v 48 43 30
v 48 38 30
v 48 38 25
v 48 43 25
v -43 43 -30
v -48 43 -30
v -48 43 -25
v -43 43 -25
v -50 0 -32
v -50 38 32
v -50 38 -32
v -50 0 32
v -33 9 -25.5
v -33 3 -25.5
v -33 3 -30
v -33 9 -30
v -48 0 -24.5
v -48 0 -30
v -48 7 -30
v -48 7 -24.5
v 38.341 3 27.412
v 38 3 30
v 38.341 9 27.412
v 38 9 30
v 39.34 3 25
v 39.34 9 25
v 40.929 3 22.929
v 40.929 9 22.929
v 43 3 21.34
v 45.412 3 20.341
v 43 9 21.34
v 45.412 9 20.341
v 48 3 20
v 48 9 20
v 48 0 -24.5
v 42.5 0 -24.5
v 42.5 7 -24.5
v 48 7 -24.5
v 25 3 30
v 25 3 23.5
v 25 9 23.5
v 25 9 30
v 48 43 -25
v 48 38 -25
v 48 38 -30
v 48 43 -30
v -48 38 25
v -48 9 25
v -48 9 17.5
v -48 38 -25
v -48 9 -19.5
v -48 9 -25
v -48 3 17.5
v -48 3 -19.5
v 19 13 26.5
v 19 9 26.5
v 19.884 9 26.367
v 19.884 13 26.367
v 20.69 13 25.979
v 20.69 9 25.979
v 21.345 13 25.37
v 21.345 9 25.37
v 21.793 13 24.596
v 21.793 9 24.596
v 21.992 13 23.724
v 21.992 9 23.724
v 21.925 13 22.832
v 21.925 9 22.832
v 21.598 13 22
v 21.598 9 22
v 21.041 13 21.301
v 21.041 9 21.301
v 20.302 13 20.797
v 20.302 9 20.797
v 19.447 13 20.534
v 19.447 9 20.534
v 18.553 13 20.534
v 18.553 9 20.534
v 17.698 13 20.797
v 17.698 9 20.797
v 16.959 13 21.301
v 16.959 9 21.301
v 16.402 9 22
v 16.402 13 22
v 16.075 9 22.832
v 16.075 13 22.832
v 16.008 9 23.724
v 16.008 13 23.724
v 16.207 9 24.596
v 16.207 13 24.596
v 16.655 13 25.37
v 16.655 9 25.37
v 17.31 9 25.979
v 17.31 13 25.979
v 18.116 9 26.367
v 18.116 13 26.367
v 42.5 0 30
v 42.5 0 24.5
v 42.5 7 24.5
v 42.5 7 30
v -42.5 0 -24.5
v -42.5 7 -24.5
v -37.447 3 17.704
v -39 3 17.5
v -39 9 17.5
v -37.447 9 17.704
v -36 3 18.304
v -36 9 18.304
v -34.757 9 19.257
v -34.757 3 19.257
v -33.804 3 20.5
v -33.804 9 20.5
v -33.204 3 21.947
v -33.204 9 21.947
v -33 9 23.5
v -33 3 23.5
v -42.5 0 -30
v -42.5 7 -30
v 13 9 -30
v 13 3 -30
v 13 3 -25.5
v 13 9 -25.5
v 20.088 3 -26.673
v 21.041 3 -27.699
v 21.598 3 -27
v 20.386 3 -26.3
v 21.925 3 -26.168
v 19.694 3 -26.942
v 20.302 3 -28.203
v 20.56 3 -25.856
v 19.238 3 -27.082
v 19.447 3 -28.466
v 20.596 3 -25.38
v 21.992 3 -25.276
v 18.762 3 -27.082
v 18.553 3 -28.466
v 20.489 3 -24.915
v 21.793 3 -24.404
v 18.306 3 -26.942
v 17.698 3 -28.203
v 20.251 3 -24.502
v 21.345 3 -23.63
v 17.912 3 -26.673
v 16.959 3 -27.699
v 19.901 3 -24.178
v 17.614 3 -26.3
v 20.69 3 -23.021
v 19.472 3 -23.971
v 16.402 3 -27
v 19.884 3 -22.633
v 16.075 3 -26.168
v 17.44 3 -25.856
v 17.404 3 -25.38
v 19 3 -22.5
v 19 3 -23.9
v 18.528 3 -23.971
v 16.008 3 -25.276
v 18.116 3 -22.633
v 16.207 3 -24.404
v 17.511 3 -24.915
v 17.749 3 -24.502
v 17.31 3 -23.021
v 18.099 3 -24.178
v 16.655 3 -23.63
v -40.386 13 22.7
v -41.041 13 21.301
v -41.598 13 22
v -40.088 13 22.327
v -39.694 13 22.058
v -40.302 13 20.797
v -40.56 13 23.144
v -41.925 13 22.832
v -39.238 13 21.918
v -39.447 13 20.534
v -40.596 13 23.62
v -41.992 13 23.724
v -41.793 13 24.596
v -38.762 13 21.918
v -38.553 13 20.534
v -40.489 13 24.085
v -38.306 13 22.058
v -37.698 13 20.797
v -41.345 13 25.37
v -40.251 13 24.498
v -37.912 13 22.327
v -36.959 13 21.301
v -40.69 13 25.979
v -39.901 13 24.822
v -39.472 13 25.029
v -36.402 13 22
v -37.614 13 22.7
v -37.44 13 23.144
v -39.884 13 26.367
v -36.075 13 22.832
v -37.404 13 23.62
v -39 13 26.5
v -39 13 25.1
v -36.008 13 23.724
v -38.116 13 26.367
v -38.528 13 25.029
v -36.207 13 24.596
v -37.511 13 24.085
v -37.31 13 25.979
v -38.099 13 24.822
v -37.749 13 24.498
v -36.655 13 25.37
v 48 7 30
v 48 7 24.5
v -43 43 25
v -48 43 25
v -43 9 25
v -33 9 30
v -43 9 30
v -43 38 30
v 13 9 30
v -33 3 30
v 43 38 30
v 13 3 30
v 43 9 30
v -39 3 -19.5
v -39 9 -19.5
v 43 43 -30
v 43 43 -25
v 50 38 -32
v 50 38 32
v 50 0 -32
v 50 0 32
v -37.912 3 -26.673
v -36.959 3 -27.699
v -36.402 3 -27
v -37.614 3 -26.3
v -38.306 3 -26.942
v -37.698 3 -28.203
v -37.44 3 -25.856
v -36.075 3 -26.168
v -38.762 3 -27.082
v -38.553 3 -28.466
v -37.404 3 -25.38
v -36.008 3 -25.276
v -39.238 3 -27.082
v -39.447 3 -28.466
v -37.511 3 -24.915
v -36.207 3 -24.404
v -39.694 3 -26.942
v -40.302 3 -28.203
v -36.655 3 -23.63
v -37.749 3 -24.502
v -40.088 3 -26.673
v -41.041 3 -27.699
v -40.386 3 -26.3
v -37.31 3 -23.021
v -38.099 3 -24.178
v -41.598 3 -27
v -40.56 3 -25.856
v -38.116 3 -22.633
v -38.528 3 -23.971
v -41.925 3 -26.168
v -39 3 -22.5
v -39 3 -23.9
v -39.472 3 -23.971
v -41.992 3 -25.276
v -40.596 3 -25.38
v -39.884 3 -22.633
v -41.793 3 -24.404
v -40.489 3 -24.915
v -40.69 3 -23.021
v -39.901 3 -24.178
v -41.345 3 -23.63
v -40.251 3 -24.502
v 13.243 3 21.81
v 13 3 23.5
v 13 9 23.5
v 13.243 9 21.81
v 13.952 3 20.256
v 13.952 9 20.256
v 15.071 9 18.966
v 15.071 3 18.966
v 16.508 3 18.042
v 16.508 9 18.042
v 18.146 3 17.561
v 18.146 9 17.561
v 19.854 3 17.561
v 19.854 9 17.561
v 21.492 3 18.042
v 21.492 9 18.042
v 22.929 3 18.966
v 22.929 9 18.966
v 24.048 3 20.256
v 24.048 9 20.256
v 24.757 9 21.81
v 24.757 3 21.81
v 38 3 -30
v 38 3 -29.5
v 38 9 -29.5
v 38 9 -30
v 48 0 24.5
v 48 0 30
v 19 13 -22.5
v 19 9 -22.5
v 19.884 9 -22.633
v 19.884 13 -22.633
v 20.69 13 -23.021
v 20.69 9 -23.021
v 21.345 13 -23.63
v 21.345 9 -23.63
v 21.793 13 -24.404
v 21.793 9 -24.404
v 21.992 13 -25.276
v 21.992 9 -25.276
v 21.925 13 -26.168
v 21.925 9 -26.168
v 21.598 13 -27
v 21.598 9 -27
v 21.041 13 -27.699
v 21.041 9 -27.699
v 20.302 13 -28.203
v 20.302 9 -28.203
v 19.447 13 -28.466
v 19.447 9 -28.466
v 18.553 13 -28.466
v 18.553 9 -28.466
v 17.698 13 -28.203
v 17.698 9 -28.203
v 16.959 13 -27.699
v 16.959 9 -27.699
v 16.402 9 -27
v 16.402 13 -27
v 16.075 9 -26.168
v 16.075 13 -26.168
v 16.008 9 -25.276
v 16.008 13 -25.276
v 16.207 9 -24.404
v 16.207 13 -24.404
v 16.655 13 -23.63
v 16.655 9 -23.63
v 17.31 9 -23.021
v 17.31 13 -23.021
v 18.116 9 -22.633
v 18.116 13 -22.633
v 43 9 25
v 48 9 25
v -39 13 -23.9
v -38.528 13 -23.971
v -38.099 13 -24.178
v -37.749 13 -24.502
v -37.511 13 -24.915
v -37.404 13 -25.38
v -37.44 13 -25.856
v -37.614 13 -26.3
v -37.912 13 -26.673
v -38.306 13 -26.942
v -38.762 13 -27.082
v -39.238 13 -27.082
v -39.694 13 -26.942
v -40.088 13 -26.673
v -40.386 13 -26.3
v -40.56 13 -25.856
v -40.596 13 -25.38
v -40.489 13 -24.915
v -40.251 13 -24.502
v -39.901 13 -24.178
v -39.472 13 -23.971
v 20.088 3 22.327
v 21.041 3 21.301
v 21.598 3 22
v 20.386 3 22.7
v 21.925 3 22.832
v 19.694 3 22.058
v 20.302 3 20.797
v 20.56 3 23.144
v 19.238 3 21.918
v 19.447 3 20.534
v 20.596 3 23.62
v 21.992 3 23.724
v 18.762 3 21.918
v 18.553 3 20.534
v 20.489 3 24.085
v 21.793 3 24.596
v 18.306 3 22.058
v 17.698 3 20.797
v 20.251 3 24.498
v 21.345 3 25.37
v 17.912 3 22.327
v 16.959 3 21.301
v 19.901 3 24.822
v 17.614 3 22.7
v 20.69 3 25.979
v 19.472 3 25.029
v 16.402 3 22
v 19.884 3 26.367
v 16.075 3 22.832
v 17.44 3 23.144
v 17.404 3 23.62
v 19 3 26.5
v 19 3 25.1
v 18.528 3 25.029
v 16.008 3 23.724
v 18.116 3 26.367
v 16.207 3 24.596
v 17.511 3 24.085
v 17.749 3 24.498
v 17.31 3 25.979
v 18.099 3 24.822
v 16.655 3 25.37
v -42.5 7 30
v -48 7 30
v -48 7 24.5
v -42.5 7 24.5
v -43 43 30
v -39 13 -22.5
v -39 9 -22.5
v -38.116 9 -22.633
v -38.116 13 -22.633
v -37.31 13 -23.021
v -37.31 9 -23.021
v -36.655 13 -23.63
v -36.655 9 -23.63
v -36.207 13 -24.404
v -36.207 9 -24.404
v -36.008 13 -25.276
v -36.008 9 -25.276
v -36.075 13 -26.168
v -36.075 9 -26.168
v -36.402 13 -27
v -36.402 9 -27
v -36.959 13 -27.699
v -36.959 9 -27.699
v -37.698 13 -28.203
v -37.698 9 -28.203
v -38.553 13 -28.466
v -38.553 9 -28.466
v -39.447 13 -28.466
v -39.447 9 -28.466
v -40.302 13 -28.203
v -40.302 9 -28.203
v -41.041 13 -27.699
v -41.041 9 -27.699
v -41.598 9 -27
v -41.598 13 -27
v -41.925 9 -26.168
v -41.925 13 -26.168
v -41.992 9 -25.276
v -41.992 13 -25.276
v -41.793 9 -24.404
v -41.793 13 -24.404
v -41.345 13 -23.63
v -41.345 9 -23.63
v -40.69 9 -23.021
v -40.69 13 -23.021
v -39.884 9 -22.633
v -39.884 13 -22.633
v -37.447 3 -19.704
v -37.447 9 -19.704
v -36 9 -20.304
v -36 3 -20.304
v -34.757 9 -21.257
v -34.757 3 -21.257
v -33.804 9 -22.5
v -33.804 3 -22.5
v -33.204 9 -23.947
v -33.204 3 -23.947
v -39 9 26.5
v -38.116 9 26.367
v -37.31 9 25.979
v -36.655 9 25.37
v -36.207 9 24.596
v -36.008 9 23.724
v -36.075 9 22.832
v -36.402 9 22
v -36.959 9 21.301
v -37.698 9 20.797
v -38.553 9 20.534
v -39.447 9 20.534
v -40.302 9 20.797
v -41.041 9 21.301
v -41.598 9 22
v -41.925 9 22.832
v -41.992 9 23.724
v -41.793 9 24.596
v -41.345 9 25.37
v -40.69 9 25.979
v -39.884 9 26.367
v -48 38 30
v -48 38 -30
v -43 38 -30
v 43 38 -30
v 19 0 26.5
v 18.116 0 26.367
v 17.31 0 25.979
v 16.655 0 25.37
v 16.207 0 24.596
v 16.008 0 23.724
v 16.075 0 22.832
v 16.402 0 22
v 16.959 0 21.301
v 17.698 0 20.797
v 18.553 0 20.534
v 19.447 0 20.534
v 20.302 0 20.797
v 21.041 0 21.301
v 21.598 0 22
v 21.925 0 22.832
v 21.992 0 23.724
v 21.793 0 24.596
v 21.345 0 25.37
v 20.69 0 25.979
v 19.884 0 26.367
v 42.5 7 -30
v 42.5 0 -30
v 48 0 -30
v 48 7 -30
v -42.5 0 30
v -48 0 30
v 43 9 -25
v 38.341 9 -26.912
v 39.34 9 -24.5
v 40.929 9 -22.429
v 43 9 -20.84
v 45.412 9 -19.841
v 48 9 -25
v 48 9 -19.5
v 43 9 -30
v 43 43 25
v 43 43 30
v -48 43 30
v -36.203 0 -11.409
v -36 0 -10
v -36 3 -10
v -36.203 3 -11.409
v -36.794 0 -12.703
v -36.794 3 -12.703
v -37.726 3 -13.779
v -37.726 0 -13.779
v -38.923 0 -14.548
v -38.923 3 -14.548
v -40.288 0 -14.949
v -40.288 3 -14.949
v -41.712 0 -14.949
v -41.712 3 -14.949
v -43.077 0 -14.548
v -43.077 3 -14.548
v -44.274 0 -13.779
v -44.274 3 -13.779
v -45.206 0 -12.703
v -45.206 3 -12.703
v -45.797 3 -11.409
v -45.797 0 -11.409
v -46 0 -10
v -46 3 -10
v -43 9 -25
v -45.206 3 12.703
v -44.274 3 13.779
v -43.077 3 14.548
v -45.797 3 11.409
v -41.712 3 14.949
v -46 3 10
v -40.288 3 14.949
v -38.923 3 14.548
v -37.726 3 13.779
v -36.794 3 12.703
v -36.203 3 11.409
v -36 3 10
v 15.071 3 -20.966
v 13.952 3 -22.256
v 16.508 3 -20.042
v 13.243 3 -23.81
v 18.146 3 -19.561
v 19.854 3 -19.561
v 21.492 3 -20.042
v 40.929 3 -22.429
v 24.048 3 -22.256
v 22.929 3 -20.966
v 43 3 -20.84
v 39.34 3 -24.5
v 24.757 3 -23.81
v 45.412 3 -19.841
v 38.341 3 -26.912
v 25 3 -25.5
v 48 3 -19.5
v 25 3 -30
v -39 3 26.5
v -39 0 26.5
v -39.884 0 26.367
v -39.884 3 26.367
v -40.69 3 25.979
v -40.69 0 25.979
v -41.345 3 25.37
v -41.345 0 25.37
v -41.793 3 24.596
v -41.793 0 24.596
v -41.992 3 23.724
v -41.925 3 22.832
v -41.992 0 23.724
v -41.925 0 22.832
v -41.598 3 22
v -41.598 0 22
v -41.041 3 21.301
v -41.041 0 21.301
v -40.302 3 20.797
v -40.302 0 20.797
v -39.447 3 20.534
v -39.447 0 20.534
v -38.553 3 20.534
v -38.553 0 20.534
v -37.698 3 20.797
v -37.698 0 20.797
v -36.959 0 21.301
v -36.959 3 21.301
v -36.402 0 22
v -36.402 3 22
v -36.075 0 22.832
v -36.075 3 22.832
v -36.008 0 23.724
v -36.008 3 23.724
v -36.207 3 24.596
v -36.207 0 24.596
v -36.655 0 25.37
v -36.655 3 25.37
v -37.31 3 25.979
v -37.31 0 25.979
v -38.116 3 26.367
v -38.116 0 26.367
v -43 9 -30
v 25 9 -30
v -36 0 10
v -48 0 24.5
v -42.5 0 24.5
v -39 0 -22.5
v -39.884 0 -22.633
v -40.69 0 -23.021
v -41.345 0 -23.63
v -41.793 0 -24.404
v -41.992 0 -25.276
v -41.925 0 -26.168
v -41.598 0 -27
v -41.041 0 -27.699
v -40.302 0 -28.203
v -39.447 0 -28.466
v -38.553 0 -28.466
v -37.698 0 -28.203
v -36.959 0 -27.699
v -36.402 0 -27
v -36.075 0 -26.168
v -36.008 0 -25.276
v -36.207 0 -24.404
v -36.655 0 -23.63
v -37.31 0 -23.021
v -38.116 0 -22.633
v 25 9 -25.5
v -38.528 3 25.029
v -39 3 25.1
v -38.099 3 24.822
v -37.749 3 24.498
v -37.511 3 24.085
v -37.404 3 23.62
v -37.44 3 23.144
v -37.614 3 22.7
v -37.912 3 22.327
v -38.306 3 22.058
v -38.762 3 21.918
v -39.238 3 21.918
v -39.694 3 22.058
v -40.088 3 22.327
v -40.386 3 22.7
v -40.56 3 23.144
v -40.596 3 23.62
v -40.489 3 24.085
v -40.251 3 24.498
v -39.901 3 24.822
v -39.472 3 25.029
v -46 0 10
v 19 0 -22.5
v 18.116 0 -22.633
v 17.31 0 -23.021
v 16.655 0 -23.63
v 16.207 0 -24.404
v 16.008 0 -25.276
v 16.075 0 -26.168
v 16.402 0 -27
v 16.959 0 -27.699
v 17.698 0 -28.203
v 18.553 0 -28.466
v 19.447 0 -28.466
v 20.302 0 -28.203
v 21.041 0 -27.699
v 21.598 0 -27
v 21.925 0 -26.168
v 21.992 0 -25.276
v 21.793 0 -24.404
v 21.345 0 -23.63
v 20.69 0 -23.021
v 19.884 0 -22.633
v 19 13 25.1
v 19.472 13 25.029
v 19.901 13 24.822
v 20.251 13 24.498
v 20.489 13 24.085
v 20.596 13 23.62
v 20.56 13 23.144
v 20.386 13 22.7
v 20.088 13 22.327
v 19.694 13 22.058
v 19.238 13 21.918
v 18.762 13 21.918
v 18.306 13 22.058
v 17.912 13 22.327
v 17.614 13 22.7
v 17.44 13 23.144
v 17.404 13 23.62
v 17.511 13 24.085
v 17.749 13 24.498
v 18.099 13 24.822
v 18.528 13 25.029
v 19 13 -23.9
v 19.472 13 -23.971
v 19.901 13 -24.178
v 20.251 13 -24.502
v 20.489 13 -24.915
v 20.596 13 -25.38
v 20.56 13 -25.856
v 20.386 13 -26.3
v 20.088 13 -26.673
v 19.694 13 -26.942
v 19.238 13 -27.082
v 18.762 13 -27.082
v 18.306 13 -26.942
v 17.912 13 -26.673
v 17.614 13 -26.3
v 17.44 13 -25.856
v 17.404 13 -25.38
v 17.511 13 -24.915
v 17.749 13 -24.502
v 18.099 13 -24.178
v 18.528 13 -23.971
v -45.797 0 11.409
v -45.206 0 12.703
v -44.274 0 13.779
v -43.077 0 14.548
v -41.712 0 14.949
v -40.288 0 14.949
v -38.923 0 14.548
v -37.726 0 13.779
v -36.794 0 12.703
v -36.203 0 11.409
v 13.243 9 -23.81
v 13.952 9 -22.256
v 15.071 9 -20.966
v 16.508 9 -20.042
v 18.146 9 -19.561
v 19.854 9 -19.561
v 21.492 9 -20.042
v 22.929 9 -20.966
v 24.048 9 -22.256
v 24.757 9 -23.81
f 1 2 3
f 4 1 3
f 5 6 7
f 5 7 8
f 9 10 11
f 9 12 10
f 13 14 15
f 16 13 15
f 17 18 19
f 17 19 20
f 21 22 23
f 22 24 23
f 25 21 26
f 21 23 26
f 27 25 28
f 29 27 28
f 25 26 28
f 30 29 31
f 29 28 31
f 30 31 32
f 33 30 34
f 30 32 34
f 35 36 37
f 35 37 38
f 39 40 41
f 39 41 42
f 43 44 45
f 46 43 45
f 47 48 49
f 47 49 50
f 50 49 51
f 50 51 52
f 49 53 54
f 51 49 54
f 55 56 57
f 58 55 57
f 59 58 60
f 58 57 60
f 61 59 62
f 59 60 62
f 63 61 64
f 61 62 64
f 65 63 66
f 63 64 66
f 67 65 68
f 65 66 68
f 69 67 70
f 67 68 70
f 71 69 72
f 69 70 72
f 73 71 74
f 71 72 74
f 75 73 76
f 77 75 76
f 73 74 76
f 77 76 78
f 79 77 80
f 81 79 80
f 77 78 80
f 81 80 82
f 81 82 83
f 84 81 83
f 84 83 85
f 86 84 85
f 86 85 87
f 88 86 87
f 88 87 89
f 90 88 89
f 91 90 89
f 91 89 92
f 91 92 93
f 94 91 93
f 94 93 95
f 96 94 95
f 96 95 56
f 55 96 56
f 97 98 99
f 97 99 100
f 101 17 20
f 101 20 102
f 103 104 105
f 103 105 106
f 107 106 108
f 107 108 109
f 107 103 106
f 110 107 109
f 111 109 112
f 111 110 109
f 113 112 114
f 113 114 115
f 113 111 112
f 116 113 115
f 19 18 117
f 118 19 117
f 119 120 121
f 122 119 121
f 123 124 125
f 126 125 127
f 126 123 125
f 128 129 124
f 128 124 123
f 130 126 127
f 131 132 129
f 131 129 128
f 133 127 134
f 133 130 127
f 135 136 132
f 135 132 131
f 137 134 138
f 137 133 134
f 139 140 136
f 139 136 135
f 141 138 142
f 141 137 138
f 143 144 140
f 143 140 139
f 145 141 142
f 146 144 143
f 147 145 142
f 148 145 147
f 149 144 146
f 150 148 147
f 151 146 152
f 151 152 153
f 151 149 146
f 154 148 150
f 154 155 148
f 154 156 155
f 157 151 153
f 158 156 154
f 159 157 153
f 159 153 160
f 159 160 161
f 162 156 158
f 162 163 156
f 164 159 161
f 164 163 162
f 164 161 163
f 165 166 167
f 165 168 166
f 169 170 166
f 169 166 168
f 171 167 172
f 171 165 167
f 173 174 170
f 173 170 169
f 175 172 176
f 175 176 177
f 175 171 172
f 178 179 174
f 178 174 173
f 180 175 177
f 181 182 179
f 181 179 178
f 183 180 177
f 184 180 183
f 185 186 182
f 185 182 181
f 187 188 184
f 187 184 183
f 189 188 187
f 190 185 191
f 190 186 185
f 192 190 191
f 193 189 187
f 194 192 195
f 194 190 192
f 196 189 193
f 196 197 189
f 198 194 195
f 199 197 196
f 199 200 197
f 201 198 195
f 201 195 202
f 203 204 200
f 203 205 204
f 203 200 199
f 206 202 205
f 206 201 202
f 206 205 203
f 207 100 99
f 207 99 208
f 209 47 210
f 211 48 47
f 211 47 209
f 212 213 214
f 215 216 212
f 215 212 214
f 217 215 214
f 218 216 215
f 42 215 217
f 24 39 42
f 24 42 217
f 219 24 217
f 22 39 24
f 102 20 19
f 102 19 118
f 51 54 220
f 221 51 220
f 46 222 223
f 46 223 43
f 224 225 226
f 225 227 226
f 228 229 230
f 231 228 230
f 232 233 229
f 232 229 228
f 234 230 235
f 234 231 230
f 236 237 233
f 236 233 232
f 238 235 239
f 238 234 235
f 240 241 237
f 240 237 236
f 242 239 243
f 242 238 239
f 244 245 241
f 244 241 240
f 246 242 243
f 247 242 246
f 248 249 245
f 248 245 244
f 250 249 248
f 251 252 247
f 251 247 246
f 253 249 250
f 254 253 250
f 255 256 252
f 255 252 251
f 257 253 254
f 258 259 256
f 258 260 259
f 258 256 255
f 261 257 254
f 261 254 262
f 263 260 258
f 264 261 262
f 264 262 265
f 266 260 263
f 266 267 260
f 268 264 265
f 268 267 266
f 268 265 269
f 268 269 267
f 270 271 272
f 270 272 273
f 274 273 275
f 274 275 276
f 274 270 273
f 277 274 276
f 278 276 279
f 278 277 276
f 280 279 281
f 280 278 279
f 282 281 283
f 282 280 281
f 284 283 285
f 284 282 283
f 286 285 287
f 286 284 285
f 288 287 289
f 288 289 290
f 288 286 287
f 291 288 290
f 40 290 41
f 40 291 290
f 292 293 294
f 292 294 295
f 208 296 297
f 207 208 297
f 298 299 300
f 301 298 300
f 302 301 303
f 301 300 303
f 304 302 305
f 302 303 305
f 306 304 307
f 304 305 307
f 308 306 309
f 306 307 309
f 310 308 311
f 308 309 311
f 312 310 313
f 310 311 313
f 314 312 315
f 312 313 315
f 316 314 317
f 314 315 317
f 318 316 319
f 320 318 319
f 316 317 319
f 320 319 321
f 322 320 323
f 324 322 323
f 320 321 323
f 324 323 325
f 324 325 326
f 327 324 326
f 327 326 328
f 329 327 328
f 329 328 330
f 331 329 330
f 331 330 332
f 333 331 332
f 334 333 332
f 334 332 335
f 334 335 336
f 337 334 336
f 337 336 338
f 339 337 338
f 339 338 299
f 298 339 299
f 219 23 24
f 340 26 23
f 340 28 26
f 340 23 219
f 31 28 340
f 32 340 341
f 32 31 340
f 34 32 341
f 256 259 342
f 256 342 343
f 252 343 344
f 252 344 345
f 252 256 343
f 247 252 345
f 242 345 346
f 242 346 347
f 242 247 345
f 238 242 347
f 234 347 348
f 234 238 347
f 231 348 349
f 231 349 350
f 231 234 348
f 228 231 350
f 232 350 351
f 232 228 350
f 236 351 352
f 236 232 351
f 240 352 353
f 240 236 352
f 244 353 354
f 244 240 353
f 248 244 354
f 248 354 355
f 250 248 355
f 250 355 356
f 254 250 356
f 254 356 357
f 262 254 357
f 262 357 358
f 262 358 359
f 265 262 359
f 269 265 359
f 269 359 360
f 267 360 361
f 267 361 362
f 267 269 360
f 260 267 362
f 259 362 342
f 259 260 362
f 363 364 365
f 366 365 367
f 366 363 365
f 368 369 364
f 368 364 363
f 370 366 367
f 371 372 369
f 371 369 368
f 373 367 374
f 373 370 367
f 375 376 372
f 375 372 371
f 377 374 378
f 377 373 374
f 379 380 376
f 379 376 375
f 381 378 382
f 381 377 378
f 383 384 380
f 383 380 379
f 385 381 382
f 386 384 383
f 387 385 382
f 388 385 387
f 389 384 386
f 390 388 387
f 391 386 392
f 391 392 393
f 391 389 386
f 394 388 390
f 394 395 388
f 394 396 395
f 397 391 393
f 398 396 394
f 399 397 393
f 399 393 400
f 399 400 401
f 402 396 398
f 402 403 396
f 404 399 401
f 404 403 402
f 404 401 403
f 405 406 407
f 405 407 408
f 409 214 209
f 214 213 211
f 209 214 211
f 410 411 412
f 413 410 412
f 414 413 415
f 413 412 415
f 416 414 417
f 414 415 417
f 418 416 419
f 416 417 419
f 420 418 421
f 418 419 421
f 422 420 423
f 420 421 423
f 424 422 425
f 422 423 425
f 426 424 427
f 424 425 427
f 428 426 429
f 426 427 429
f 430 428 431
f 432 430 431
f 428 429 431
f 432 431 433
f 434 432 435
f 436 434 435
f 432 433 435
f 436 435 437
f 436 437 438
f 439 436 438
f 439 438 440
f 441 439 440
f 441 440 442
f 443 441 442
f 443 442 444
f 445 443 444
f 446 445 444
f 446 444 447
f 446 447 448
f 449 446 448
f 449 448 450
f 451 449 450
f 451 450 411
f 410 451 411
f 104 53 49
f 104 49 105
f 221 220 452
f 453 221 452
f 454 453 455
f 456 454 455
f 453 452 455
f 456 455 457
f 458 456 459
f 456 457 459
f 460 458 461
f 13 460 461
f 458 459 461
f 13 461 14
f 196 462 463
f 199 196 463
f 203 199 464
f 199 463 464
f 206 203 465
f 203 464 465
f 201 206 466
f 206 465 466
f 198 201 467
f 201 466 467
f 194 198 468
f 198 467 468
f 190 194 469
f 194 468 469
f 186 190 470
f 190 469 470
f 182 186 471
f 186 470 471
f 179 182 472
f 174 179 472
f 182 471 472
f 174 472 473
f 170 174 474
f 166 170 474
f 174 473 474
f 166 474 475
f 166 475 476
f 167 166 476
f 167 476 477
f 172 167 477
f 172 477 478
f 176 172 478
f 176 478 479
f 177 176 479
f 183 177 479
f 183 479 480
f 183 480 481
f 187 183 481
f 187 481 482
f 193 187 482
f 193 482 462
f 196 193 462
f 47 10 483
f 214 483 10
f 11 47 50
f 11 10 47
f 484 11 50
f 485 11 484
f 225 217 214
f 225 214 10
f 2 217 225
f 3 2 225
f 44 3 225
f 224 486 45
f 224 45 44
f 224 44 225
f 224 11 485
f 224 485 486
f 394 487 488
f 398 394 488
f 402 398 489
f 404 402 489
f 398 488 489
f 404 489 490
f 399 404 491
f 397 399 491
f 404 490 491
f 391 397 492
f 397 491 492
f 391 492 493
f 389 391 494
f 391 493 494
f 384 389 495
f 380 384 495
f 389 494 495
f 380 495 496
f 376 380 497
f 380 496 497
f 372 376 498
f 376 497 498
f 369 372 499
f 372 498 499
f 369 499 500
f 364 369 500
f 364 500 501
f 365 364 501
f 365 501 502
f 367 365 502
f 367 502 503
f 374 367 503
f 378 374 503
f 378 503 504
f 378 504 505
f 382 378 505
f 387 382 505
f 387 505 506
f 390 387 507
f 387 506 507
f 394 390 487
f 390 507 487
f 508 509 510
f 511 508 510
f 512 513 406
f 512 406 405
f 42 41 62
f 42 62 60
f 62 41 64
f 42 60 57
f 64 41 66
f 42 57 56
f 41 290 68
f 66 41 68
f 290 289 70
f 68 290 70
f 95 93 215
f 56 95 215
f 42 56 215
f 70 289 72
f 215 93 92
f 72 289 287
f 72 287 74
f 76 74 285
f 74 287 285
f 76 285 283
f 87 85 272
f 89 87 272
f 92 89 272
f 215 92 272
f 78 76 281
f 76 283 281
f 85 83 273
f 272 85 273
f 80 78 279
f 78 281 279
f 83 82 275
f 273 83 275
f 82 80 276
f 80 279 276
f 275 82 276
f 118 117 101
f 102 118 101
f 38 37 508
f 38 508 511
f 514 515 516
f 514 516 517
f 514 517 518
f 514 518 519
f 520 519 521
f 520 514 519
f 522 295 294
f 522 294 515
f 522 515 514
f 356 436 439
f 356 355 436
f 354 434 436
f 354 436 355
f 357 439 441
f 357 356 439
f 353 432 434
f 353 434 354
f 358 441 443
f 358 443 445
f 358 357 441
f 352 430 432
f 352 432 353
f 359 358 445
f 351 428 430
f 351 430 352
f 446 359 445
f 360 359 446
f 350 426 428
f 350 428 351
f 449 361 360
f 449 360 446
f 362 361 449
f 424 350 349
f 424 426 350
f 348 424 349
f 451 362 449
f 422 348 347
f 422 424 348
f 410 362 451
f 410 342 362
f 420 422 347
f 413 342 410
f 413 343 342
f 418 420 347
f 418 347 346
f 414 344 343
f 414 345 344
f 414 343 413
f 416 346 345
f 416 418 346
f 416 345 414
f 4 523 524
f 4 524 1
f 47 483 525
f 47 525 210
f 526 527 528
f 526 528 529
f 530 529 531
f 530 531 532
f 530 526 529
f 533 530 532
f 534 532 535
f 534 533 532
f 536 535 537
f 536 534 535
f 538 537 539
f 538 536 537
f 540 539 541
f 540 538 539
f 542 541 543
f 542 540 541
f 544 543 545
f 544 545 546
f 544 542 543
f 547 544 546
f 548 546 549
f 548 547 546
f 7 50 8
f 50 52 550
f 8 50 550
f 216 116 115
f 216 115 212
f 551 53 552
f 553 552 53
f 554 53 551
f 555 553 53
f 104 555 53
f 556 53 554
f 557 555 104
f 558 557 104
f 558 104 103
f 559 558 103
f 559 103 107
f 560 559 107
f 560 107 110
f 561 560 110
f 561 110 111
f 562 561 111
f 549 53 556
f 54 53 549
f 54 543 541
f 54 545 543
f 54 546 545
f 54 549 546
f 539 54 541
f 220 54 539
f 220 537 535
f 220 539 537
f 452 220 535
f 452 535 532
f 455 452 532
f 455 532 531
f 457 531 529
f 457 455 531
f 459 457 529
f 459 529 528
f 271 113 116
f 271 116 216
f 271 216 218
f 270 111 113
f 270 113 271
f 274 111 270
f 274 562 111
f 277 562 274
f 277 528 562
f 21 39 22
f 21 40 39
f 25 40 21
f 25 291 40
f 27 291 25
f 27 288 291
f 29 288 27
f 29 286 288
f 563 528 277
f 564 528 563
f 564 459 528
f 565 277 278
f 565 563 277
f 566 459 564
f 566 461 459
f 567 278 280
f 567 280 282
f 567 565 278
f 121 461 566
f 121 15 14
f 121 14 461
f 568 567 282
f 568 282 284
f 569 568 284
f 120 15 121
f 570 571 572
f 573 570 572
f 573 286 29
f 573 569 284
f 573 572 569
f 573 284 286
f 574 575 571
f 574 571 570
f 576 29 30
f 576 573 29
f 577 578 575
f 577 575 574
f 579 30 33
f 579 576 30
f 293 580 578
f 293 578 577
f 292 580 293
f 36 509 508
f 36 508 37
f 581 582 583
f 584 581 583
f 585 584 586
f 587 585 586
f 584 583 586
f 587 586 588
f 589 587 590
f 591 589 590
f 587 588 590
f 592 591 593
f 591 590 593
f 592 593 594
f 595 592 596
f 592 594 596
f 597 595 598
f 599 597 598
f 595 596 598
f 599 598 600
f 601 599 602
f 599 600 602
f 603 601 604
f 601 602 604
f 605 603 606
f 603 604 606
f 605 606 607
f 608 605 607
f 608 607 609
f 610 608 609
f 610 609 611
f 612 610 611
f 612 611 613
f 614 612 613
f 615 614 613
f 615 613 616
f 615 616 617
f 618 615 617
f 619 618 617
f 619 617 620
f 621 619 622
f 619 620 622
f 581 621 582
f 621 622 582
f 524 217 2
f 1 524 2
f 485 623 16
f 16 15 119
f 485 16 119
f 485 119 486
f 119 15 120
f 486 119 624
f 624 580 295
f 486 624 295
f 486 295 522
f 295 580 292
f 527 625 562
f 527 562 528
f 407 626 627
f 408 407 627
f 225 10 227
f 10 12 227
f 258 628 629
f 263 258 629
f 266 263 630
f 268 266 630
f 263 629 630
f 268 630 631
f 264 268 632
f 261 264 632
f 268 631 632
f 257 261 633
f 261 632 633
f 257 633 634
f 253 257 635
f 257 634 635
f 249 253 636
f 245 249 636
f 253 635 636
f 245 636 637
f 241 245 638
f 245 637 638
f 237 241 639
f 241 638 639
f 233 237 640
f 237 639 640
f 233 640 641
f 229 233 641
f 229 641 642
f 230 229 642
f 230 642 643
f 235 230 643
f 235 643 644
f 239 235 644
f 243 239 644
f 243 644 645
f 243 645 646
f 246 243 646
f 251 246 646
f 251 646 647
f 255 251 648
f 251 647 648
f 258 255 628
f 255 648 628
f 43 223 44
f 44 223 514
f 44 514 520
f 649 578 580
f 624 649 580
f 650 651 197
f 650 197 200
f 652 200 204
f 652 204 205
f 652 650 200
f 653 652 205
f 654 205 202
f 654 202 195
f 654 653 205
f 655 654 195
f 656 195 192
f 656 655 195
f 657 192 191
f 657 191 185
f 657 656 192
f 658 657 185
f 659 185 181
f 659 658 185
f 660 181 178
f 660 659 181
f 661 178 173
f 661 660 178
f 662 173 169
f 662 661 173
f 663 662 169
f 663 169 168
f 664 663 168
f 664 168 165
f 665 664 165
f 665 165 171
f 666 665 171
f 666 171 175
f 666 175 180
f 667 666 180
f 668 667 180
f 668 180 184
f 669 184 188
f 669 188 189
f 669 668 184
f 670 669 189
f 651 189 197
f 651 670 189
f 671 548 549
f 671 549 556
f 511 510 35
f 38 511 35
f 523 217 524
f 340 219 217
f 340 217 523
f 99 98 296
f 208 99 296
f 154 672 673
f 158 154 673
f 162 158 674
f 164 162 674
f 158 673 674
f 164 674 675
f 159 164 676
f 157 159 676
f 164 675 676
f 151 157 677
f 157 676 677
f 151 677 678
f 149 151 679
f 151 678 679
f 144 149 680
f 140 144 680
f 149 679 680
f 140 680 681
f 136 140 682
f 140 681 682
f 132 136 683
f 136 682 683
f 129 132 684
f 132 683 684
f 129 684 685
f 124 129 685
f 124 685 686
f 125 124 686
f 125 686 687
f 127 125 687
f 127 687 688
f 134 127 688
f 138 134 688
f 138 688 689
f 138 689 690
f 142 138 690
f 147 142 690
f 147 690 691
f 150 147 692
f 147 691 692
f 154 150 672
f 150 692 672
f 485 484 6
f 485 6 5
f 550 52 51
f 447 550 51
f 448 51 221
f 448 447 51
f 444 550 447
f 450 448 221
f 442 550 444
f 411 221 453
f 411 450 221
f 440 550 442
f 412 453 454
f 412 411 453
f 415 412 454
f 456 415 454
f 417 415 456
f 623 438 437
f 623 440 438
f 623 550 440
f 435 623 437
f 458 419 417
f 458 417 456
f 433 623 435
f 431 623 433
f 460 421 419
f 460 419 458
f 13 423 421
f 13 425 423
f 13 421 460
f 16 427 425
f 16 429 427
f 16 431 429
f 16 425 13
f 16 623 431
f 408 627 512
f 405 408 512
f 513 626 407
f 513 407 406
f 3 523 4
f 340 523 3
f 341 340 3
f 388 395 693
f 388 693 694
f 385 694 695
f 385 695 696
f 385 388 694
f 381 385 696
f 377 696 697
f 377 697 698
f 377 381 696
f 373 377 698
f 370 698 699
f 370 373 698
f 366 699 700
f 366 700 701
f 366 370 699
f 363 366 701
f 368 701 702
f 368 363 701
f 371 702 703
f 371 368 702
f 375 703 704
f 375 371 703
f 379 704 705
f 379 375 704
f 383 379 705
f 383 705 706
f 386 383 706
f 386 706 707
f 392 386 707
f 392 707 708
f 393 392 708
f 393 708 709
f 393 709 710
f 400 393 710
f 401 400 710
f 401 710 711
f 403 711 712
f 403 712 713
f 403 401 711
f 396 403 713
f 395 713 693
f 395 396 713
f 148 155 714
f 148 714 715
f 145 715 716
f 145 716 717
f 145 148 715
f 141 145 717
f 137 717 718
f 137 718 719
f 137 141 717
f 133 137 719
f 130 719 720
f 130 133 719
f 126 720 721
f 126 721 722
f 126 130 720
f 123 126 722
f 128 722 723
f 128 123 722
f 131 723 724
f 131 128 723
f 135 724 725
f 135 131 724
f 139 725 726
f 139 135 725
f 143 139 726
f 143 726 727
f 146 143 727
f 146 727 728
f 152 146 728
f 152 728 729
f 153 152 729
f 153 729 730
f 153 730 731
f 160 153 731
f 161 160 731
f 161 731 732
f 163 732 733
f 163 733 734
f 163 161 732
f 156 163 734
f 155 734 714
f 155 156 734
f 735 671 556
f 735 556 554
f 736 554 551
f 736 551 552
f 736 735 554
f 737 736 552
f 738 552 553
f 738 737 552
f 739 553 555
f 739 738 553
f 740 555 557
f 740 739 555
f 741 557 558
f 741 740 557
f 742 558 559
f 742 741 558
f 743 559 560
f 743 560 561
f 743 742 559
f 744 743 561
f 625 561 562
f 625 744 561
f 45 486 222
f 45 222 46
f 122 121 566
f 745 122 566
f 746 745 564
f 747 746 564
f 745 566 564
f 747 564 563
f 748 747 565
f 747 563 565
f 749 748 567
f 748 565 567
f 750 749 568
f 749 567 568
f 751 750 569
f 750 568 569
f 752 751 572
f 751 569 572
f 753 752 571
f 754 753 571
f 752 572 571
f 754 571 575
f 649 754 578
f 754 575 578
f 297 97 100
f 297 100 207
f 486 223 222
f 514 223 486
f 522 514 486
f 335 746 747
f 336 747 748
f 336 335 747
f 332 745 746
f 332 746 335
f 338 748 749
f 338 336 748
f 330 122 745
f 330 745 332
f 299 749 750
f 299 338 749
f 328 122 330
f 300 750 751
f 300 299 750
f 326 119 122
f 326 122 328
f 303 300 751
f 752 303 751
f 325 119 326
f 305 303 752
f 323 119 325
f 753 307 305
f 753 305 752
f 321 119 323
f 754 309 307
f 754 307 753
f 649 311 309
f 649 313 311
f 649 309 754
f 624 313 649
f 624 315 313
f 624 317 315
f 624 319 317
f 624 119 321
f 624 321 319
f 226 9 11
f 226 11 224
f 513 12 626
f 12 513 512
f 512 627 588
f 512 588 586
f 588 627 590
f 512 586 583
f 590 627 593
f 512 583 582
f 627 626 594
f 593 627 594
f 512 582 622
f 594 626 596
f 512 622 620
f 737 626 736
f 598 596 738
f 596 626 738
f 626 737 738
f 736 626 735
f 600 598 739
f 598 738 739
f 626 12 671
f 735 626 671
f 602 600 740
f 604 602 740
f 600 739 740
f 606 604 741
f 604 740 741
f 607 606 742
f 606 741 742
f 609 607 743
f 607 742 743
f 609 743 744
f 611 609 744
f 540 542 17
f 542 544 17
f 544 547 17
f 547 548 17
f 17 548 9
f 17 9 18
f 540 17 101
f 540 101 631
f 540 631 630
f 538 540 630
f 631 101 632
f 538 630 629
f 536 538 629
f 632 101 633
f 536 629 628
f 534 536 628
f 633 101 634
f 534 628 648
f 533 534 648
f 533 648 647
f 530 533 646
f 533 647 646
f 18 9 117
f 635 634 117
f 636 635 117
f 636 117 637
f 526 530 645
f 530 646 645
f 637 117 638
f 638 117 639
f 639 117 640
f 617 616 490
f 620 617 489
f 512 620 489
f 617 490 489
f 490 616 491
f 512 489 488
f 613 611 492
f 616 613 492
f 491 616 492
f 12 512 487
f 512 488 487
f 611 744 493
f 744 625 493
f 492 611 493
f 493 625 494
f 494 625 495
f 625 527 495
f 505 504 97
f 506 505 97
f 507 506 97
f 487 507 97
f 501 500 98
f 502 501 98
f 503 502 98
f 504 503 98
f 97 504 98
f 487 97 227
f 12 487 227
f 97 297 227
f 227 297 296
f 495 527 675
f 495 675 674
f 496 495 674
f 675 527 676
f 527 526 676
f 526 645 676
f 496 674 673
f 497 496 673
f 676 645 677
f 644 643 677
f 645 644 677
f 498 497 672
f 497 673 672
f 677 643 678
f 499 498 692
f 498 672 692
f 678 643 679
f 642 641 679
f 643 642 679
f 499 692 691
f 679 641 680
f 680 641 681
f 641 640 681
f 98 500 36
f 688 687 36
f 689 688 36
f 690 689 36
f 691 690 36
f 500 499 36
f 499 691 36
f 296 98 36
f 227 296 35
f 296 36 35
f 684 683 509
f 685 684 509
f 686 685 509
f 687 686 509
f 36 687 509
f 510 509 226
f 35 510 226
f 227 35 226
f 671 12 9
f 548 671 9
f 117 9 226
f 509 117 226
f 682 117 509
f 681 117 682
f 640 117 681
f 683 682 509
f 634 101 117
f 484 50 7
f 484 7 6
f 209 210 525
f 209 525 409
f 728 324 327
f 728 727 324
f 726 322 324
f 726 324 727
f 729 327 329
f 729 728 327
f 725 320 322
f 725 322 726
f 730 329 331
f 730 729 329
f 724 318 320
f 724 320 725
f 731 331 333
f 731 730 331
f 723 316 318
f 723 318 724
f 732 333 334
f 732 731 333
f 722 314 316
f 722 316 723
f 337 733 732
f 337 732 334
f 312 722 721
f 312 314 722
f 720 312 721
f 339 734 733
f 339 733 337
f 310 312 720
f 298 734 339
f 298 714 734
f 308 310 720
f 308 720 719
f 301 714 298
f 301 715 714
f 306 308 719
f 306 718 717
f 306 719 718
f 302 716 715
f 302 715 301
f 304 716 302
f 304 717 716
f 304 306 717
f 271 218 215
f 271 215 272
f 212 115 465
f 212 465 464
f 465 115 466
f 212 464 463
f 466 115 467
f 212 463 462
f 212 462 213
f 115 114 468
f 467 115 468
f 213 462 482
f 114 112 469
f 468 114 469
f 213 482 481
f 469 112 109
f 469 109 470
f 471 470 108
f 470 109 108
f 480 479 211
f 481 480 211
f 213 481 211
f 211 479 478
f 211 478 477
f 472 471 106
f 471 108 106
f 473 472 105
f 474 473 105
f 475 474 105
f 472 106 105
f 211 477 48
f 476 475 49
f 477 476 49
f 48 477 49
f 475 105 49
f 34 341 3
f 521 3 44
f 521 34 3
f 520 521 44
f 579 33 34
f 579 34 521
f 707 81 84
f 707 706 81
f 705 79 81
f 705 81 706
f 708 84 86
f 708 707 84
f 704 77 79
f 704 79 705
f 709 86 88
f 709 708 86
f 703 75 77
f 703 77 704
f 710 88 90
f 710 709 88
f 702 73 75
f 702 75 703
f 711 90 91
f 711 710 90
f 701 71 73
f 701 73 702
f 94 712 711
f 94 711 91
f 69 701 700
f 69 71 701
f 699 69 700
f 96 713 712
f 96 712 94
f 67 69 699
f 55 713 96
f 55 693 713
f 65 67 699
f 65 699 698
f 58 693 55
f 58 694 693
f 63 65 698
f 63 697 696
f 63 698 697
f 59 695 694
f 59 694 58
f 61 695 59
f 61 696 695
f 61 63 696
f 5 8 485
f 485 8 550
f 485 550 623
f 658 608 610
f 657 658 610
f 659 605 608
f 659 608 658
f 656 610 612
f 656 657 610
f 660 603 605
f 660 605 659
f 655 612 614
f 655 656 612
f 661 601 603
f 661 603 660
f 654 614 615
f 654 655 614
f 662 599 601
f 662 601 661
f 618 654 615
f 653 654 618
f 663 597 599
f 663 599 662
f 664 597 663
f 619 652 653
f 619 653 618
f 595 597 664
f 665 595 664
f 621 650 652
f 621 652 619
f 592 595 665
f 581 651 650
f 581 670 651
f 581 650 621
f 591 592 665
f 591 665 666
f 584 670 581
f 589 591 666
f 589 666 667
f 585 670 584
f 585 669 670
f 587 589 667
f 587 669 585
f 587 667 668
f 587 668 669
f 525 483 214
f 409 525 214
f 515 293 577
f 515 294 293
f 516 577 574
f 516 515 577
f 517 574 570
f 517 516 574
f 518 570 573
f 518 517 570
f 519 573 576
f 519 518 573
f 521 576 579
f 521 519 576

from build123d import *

# Parameters (mm, degrees)
SKETCH1_W                = 100
SKETCH1_H                = 64
BOSS_EXTRUDE1_DEPTH      = 3
SKETCH2_W                = 100
SKETCH2_H                = 64
SKETCH2_W_2              = 96
SKETCH2_H_2              = 60
BOSS_EXTRUDE2_DEPTH      = 35
SKETCH6_R                = 3
SKETCH6_R_2              = 1.6
BOSS_EXTRUDE3_DEPTH      = 10
SKETCH7_R                = 1.5
CUT_EXTRUDE2_DEPTH       = 69.912988616
BOSS_EXTRUDE8_START      = -10
SKETCH10_R               = 3
SKETCH10_W               = 10
SKETCH10_H               = 10.5
SKETCH10_H_2             = 10
BOSS_EXTRUDE8_DEPTH      = 6
SKETCH11_R               = 3
CUT_EXTRUDE4_DEPTH       = 3
BOSS_EXTRUDE9_DEPTH      = 5
BOSS_EXTRUDE9_DEPTH_BACK = 37
SKETCH12_W               = 5
SKETCH12_H               = 5
SKETCH13_W               = 5.5
SKETCH13_H               = 5.5
CUT_EXTRUDE5_DEPTH       = 7
FILLET1_R                = 10


with BuildPart() as part:
    # Sketch1 → Boss-Extrude1 (new body)
    with BuildSketch(Plane(origin=(0, 0, 0), x_dir=(1, 0, 0), z_dir=(0, 1, 0))):
        Rectangle(SKETCH1_W, SKETCH1_H)
    extrude(amount=BOSS_EXTRUDE1_DEPTH)

    # Sketch2 → Boss-Extrude2 (add)
    with BuildSketch(Plane(origin=(0, 3, 0), x_dir=(1, 0, 0), z_dir=(0, 1, 0))):
        Rectangle(SKETCH2_W, SKETCH2_H)
        Rectangle(SKETCH2_W_2, SKETCH2_H_2, mode=Mode.SUBTRACT)
    extrude(amount=BOSS_EXTRUDE2_DEPTH)

    # Sketch6 → Boss-Extrude3 (add)
    # profile 1 of 4: a face of its own
    with BuildSketch(Plane(origin=(0, 3, 0), x_dir=(1, 0, 0), z_dir=(0, 1, 0))):
        with Locations(Location((-39, 25.5, 0), (0, 0, 270))):
            Circle(SKETCH6_R)
        with Locations(Location((-39, 25.5, 0), (0, 0, 270))):
            Circle(SKETCH6_R_2, mode=Mode.SUBTRACT)
    # profile 2 of 4: a face of its own
    with BuildSketch(Plane(origin=(0, 3, 0), x_dir=(1, 0, 0), z_dir=(0, 1, 0))):
        with Locations(Location((19, 25.5, 0), (0, 0, 270))):
            Circle(SKETCH6_R)
        with Locations(Location((19, 25.5, 0), (0, 0, 270))):
            Circle(SKETCH6_R_2, mode=Mode.SUBTRACT)
    # profile 3 of 4: a face of its own
    with BuildSketch(Plane(origin=(0, 3, 0), x_dir=(1, 0, 0), z_dir=(0, 1, 0))):
        with Locations(Location((-39, -23.5, 0), (0, 0, 270))):
            Circle(SKETCH6_R)
        with Locations(Location((-39, -23.5, 0), (0, 0, 270))):
            Circle(SKETCH6_R_2, mode=Mode.SUBTRACT)
    # profile 4 of 4: a face of its own
    with BuildSketch(Plane(origin=(0, 3, 0), x_dir=(1, 0, 0), z_dir=(0, 1, 0))):
        with Locations(Location((19, -23.5, 0), (0, 0, 270))):
            Circle(SKETCH6_R)
        with Locations(Location((19, -23.5, 0), (0, 0, 270))):
            Circle(SKETCH6_R_2, mode=Mode.SUBTRACT)
    extrude(amount=BOSS_EXTRUDE3_DEPTH)

    # Sketch7 → Cut-Extrude2 (cut, through all)
    with BuildSketch(Plane(origin=(0, 3, 0), x_dir=(1, 0, 0), z_dir=(0, 1, 0))):
        with Locations(Location((-39, 25.5, 0), (0, 0, 270))):
            Circle(SKETCH7_R)
        with Locations(Location((19, 25.5, 0), (0, 0, 270))):
            Circle(SKETCH7_R)
        with Locations(Location((19, -23.5, 0), (0, 0, 270))):
            Circle(SKETCH7_R)
        with Locations(Location((-39, -23.5, 0), (0, 0, 270))):
            Circle(SKETCH7_R)
    extrude(amount=-CUT_EXTRUDE2_DEPTH, mode=Mode.SUBTRACT)

    # Sketch10 → Boss-Extrude8 (add)
    # profile 1 of 6: a face of its own
    with BuildSketch(Plane(origin=(0, 13, 0), x_dir=(1, 0, 0), z_dir=(0, 1, 0)).offset(BOSS_EXTRUDE8_START)):
        with BuildLine():
            Line((-33, 25.5), (-33, 30))
            Line((-33, 30), (-48, 30))
            Line((-48, 30), (-48, 19.5))
            Line((-48, 19.5), (-39, 19.5))
            ThreePointArc((-39, 19.5), (-34.757359313, 21.257359313), (-33, 25.5))
        make_face()
        with Locations(Location((-39, 25.5, 0), (0, 0, 270))):
            Circle(SKETCH10_R, mode=Mode.SUBTRACT)
    # profile 2 of 6: a face of its own
    with BuildSketch(Plane(origin=(0, 13, 0), x_dir=(1, 0, 0), z_dir=(0, 1, 0)).offset(BOSS_EXTRUDE8_START)):
        with BuildLine():
            Line((25, 25.5), (25, 30))
            Line((25, 30), (13, 30))
            Line((13, 30), (13, 25.5))
            ThreePointArc((13, 25.5), (19, 19.5), (25, 25.5))
        make_face()
        with Locations(Location((19, 25.5, 0), (0, 0, 270))):
            Circle(SKETCH10_R, mode=Mode.SUBTRACT)
    # profile 3 of 6: a face of its own
    with BuildSketch(Plane(origin=(0, 13, 0), x_dir=(1, 0, 0), z_dir=(0, 1, 0)).offset(BOSS_EXTRUDE8_START)):
        with BuildLine():
            Line((25, -23.5), (25, -30))
            Line((25, -30), (13, -30))
            Line((13, -30), (13, -23.5))
            ThreePointArc((13, -23.5), (19, -17.5), (25, -23.5))
        make_face()
        with Locations(Location((19, -23.5, 0), (0, 0, 270))):
            Circle(SKETCH10_R, mode=Mode.SUBTRACT)
    # profile 4 of 6: a face of its own
    with BuildSketch(Plane(origin=(0, 13, 0), x_dir=(1, 0, 0), z_dir=(0, 1, 0)).offset(BOSS_EXTRUDE8_START)):
        with BuildLine():
            Line((-33, -23.5), (-33, -30))
            Line((-33, -30), (-48, -30))
            Line((-48, -30), (-48, -17.5))
            Line((-48, -17.5), (-39, -17.5))
            ThreePointArc((-39, -17.5), (-34.757359313, -19.257359313), (-33, -23.5))
        make_face()
        with Locations(Location((-39, -23.5, 0), (0, 0, 270))):
            Circle(SKETCH10_R, mode=Mode.SUBTRACT)
    # profile 5 of 6: a face of its own
    with BuildSketch(Plane(origin=(0, 13, 0), x_dir=(1, 0, 0), z_dir=(0, 1, 0)).offset(BOSS_EXTRUDE8_START)):
        with Locations((43, 24.75)):
            Rectangle(SKETCH10_W, SKETCH10_H)
    # profile 6 of 6: a face of its own
    with BuildSketch(Plane(origin=(0, 13, 0), x_dir=(1, 0, 0), z_dir=(0, 1, 0)).offset(BOSS_EXTRUDE8_START)):
        with Locations((43, -25)):
            Rectangle(SKETCH10_W, SKETCH10_H_2)
    extrude(amount=BOSS_EXTRUDE8_DEPTH)

    # Sketch11 → Cut-Extrude4 (cut)
    with BuildSketch(Plane.XZ):
        with Locations(Location((-39, 23.5, 0), (0, 0, 90))):
            Circle(SKETCH11_R)
        with Locations(Location((19, 23.5, 0), (0, 0, 90))):
            Circle(SKETCH11_R)
        with Locations(Location((19, -25.5, 0), (0, 0, 90))):
            Circle(SKETCH11_R)
        with Locations(Location((-39, -25.5, 0), (0, 0, 90))):
            Circle(SKETCH11_R)
        with BuildLine():
            Line((-46, -10), (-46, 10))
            ThreePointArc((-46, 10), (-41, 15), (-36, 10))
            Line((-36, 10), (-36, -10))
            ThreePointArc((-36, -10), (-41, -15), (-46, -10))
        make_face()
    extrude(amount=-CUT_EXTRUDE4_DEPTH, mode=Mode.SUBTRACT)

    # Sketch12 → Boss-Extrude9 (add, two sides: drawn at the far end of the back side and taken through both)
    with BuildSketch(Plane(origin=(0, 38, 0), x_dir=(1, 0, 0), z_dir=(0, 1, 0)).offset(-BOSS_EXTRUDE9_DEPTH_BACK)):
        with Locations((-45.5, 27.5)):
            Rectangle(SKETCH12_W, SKETCH12_H)
        with Locations((45.5, 27.5)):
            Rectangle(SKETCH12_W, SKETCH12_H)
        with Locations((45.5, -27.5)):
            Rectangle(SKETCH12_W, SKETCH12_H)
        with Locations((-45.5, -27.5)):
            Rectangle(SKETCH12_W, SKETCH12_H)
    extrude(amount=BOSS_EXTRUDE9_DEPTH + BOSS_EXTRUDE9_DEPTH_BACK)

    # Sketch13 → Cut-Extrude5 (cut)
    with BuildSketch(Plane.XZ):
        with Locations((-45.25, 27.25)):
            Rectangle(SKETCH13_W, SKETCH13_H)
        with Locations((-45.25, -27.25)):
            Rectangle(SKETCH13_W, SKETCH13_H)
        with Locations((45.25, -27.25)):
            Rectangle(SKETCH13_W, SKETCH13_H)
        with Locations((45.25, 27.25)):
            Rectangle(SKETCH13_W, SKETCH13_H)
    extrude(amount=-CUT_EXTRUDE5_DEPTH, mode=Mode.SUBTRACT)

    # Fillet1
    fillet1_edges = [part.edges().sort_by_distance(p)[0] for p in [
        (38, 6, 20),
        (38, 6, -19.5),
    ]]
    fillet(fillet1_edges, radius=FILLET1_R - 0.0001)  # a hair under: the kernel refuses the full size


solid = part.part
